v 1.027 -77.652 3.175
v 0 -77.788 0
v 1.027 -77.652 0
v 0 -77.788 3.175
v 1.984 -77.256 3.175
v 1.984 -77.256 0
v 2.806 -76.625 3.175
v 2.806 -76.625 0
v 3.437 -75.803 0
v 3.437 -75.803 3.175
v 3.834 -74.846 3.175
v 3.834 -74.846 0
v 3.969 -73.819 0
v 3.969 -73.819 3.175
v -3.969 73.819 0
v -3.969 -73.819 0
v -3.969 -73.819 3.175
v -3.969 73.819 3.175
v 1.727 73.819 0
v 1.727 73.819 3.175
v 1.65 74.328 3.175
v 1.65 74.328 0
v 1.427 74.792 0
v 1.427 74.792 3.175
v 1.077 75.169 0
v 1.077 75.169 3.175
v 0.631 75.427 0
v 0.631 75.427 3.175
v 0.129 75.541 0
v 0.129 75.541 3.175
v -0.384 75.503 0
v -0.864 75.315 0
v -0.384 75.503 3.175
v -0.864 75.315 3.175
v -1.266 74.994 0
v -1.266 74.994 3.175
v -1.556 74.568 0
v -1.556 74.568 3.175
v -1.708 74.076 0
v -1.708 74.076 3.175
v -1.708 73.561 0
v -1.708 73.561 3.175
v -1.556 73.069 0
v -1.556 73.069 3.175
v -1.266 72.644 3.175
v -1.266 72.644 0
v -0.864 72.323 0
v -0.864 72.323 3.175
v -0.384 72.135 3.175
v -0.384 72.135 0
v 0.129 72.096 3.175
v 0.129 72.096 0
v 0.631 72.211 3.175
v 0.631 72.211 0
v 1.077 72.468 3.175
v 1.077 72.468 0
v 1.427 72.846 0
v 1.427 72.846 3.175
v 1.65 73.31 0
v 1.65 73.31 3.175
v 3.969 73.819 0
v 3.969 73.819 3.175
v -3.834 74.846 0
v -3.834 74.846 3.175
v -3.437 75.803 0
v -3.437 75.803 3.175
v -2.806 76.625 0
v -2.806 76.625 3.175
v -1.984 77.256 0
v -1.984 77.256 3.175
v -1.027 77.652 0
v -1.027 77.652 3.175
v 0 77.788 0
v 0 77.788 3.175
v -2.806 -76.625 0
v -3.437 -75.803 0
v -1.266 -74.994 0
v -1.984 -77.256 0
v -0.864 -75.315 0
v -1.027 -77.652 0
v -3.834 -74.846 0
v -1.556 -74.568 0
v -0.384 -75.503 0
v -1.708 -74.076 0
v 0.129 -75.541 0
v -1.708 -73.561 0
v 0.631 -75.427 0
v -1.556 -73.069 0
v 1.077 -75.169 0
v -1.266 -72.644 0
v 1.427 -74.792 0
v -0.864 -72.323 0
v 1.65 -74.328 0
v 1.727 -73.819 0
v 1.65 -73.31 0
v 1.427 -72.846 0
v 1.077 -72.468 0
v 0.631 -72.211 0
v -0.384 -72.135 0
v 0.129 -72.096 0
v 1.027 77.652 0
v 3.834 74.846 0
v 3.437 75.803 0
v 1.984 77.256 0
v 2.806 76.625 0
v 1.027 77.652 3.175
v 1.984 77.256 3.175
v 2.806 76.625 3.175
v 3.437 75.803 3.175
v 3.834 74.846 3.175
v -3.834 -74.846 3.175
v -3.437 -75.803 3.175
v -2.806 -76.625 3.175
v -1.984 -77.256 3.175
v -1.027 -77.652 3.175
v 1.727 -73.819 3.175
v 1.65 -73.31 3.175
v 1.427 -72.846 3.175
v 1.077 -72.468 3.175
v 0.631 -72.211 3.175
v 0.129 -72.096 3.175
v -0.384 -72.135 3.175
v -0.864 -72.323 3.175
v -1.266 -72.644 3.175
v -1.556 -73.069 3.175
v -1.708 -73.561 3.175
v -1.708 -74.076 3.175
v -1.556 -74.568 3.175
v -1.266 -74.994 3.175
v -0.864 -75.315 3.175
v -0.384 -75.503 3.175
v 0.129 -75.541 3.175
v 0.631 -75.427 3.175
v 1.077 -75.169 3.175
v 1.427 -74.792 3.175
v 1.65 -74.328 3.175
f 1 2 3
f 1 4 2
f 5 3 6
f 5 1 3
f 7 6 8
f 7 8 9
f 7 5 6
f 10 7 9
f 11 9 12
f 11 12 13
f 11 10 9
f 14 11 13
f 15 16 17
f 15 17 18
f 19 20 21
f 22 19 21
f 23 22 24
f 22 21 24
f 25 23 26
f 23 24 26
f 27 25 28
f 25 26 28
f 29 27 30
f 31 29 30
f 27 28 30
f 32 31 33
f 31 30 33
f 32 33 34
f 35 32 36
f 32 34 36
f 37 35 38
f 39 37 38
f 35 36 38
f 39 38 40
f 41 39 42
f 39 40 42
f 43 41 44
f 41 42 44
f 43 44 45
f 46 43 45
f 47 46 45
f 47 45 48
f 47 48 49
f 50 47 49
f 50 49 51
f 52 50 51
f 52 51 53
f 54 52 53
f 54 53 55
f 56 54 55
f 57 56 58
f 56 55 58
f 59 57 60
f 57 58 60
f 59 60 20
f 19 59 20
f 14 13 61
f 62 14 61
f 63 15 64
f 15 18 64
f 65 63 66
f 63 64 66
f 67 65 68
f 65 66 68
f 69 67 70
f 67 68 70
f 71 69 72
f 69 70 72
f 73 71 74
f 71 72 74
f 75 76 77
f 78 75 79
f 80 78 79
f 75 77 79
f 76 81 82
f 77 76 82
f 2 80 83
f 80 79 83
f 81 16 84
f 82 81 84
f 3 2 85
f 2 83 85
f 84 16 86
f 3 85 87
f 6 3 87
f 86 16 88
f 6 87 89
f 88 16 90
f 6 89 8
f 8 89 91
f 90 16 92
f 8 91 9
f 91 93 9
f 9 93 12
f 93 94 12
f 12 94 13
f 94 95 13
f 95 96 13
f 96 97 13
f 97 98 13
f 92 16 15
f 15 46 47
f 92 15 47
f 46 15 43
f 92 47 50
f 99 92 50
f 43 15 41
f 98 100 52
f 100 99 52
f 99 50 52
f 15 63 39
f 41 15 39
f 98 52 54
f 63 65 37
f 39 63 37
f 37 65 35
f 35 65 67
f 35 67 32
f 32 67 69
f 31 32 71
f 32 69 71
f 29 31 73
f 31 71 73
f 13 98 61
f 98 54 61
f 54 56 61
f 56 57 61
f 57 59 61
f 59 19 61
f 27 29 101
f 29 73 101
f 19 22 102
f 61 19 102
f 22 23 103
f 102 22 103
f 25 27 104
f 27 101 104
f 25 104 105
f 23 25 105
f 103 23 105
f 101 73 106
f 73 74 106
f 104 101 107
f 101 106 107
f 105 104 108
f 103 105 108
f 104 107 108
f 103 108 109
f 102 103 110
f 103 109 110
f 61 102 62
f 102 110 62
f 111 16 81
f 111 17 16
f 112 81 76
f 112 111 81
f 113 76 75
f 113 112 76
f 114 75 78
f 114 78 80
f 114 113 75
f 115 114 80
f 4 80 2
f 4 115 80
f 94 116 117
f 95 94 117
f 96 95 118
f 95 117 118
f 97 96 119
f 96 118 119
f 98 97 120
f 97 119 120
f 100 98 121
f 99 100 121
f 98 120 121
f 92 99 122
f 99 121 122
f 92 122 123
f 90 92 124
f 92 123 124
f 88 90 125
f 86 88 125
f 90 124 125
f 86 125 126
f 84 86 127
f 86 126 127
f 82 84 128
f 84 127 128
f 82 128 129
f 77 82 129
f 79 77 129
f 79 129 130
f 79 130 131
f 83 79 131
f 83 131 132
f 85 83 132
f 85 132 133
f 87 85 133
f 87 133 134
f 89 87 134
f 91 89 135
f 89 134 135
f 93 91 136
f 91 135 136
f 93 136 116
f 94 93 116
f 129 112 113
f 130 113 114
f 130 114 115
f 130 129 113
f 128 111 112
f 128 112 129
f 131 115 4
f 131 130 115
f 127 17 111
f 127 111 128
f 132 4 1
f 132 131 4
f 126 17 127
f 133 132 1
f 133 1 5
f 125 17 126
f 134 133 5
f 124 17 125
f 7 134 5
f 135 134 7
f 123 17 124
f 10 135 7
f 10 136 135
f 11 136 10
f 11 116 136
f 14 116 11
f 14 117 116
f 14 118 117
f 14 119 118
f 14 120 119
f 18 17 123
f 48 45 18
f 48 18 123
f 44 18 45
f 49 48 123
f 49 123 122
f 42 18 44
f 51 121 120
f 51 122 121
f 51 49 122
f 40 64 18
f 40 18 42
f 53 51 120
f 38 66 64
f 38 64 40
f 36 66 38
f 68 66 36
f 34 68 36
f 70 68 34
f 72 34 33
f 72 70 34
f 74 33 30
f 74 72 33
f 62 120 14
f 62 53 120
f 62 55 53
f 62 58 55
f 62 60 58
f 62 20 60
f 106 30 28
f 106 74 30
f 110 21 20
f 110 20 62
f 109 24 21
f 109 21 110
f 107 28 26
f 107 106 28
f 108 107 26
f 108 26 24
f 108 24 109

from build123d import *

# Parameters (mm, degrees)
F0_W     = 7.9375
F0_H     = 155.575
F1_DEPTH = 3.175
F2_R     = 1.7272
F3_DEPTH = 3.175
F4_R     = 3.96874


# Not quite as in the source:
# - a fillet or chamfer is up to 0.001 mm smaller than in the source, because OpenCascade refuses the exact size


with BuildPart() as f1:
    # F0 (on Top) → F1 (new body)
    with BuildSketch(Plane.XY):
        Rectangle(F0_W, F0_H)
    extrude(amount=F1_DEPTH)

    # F2 (on face) → F3 (cut, through all)
    with BuildSketch(Plane.XY.offset(3.175)):
        with Locations((0, 73.81875)):
            Circle(F2_R)
        with Locations((0, -73.81875)):
            Circle(F2_R)
    extrude(amount=-F3_DEPTH, mode=Mode.SUBTRACT)

    # F4 (radius 3.96875 in the source; OpenCascade refuses exactly that, so slightly less here)
    f4_edges = [f1.edges().sort_by_distance(p)[0] for p in [
        (-3.96875, -77.7875, 1.5875),
        (3.96875, -77.7875, 1.5875),
        (3.96875, 77.7875, 1.5875),
        (-3.96875, 77.7875, 1.5875),
    ]]
    fillet(f4_edges, radius=F4_R)


solid = f1.part
